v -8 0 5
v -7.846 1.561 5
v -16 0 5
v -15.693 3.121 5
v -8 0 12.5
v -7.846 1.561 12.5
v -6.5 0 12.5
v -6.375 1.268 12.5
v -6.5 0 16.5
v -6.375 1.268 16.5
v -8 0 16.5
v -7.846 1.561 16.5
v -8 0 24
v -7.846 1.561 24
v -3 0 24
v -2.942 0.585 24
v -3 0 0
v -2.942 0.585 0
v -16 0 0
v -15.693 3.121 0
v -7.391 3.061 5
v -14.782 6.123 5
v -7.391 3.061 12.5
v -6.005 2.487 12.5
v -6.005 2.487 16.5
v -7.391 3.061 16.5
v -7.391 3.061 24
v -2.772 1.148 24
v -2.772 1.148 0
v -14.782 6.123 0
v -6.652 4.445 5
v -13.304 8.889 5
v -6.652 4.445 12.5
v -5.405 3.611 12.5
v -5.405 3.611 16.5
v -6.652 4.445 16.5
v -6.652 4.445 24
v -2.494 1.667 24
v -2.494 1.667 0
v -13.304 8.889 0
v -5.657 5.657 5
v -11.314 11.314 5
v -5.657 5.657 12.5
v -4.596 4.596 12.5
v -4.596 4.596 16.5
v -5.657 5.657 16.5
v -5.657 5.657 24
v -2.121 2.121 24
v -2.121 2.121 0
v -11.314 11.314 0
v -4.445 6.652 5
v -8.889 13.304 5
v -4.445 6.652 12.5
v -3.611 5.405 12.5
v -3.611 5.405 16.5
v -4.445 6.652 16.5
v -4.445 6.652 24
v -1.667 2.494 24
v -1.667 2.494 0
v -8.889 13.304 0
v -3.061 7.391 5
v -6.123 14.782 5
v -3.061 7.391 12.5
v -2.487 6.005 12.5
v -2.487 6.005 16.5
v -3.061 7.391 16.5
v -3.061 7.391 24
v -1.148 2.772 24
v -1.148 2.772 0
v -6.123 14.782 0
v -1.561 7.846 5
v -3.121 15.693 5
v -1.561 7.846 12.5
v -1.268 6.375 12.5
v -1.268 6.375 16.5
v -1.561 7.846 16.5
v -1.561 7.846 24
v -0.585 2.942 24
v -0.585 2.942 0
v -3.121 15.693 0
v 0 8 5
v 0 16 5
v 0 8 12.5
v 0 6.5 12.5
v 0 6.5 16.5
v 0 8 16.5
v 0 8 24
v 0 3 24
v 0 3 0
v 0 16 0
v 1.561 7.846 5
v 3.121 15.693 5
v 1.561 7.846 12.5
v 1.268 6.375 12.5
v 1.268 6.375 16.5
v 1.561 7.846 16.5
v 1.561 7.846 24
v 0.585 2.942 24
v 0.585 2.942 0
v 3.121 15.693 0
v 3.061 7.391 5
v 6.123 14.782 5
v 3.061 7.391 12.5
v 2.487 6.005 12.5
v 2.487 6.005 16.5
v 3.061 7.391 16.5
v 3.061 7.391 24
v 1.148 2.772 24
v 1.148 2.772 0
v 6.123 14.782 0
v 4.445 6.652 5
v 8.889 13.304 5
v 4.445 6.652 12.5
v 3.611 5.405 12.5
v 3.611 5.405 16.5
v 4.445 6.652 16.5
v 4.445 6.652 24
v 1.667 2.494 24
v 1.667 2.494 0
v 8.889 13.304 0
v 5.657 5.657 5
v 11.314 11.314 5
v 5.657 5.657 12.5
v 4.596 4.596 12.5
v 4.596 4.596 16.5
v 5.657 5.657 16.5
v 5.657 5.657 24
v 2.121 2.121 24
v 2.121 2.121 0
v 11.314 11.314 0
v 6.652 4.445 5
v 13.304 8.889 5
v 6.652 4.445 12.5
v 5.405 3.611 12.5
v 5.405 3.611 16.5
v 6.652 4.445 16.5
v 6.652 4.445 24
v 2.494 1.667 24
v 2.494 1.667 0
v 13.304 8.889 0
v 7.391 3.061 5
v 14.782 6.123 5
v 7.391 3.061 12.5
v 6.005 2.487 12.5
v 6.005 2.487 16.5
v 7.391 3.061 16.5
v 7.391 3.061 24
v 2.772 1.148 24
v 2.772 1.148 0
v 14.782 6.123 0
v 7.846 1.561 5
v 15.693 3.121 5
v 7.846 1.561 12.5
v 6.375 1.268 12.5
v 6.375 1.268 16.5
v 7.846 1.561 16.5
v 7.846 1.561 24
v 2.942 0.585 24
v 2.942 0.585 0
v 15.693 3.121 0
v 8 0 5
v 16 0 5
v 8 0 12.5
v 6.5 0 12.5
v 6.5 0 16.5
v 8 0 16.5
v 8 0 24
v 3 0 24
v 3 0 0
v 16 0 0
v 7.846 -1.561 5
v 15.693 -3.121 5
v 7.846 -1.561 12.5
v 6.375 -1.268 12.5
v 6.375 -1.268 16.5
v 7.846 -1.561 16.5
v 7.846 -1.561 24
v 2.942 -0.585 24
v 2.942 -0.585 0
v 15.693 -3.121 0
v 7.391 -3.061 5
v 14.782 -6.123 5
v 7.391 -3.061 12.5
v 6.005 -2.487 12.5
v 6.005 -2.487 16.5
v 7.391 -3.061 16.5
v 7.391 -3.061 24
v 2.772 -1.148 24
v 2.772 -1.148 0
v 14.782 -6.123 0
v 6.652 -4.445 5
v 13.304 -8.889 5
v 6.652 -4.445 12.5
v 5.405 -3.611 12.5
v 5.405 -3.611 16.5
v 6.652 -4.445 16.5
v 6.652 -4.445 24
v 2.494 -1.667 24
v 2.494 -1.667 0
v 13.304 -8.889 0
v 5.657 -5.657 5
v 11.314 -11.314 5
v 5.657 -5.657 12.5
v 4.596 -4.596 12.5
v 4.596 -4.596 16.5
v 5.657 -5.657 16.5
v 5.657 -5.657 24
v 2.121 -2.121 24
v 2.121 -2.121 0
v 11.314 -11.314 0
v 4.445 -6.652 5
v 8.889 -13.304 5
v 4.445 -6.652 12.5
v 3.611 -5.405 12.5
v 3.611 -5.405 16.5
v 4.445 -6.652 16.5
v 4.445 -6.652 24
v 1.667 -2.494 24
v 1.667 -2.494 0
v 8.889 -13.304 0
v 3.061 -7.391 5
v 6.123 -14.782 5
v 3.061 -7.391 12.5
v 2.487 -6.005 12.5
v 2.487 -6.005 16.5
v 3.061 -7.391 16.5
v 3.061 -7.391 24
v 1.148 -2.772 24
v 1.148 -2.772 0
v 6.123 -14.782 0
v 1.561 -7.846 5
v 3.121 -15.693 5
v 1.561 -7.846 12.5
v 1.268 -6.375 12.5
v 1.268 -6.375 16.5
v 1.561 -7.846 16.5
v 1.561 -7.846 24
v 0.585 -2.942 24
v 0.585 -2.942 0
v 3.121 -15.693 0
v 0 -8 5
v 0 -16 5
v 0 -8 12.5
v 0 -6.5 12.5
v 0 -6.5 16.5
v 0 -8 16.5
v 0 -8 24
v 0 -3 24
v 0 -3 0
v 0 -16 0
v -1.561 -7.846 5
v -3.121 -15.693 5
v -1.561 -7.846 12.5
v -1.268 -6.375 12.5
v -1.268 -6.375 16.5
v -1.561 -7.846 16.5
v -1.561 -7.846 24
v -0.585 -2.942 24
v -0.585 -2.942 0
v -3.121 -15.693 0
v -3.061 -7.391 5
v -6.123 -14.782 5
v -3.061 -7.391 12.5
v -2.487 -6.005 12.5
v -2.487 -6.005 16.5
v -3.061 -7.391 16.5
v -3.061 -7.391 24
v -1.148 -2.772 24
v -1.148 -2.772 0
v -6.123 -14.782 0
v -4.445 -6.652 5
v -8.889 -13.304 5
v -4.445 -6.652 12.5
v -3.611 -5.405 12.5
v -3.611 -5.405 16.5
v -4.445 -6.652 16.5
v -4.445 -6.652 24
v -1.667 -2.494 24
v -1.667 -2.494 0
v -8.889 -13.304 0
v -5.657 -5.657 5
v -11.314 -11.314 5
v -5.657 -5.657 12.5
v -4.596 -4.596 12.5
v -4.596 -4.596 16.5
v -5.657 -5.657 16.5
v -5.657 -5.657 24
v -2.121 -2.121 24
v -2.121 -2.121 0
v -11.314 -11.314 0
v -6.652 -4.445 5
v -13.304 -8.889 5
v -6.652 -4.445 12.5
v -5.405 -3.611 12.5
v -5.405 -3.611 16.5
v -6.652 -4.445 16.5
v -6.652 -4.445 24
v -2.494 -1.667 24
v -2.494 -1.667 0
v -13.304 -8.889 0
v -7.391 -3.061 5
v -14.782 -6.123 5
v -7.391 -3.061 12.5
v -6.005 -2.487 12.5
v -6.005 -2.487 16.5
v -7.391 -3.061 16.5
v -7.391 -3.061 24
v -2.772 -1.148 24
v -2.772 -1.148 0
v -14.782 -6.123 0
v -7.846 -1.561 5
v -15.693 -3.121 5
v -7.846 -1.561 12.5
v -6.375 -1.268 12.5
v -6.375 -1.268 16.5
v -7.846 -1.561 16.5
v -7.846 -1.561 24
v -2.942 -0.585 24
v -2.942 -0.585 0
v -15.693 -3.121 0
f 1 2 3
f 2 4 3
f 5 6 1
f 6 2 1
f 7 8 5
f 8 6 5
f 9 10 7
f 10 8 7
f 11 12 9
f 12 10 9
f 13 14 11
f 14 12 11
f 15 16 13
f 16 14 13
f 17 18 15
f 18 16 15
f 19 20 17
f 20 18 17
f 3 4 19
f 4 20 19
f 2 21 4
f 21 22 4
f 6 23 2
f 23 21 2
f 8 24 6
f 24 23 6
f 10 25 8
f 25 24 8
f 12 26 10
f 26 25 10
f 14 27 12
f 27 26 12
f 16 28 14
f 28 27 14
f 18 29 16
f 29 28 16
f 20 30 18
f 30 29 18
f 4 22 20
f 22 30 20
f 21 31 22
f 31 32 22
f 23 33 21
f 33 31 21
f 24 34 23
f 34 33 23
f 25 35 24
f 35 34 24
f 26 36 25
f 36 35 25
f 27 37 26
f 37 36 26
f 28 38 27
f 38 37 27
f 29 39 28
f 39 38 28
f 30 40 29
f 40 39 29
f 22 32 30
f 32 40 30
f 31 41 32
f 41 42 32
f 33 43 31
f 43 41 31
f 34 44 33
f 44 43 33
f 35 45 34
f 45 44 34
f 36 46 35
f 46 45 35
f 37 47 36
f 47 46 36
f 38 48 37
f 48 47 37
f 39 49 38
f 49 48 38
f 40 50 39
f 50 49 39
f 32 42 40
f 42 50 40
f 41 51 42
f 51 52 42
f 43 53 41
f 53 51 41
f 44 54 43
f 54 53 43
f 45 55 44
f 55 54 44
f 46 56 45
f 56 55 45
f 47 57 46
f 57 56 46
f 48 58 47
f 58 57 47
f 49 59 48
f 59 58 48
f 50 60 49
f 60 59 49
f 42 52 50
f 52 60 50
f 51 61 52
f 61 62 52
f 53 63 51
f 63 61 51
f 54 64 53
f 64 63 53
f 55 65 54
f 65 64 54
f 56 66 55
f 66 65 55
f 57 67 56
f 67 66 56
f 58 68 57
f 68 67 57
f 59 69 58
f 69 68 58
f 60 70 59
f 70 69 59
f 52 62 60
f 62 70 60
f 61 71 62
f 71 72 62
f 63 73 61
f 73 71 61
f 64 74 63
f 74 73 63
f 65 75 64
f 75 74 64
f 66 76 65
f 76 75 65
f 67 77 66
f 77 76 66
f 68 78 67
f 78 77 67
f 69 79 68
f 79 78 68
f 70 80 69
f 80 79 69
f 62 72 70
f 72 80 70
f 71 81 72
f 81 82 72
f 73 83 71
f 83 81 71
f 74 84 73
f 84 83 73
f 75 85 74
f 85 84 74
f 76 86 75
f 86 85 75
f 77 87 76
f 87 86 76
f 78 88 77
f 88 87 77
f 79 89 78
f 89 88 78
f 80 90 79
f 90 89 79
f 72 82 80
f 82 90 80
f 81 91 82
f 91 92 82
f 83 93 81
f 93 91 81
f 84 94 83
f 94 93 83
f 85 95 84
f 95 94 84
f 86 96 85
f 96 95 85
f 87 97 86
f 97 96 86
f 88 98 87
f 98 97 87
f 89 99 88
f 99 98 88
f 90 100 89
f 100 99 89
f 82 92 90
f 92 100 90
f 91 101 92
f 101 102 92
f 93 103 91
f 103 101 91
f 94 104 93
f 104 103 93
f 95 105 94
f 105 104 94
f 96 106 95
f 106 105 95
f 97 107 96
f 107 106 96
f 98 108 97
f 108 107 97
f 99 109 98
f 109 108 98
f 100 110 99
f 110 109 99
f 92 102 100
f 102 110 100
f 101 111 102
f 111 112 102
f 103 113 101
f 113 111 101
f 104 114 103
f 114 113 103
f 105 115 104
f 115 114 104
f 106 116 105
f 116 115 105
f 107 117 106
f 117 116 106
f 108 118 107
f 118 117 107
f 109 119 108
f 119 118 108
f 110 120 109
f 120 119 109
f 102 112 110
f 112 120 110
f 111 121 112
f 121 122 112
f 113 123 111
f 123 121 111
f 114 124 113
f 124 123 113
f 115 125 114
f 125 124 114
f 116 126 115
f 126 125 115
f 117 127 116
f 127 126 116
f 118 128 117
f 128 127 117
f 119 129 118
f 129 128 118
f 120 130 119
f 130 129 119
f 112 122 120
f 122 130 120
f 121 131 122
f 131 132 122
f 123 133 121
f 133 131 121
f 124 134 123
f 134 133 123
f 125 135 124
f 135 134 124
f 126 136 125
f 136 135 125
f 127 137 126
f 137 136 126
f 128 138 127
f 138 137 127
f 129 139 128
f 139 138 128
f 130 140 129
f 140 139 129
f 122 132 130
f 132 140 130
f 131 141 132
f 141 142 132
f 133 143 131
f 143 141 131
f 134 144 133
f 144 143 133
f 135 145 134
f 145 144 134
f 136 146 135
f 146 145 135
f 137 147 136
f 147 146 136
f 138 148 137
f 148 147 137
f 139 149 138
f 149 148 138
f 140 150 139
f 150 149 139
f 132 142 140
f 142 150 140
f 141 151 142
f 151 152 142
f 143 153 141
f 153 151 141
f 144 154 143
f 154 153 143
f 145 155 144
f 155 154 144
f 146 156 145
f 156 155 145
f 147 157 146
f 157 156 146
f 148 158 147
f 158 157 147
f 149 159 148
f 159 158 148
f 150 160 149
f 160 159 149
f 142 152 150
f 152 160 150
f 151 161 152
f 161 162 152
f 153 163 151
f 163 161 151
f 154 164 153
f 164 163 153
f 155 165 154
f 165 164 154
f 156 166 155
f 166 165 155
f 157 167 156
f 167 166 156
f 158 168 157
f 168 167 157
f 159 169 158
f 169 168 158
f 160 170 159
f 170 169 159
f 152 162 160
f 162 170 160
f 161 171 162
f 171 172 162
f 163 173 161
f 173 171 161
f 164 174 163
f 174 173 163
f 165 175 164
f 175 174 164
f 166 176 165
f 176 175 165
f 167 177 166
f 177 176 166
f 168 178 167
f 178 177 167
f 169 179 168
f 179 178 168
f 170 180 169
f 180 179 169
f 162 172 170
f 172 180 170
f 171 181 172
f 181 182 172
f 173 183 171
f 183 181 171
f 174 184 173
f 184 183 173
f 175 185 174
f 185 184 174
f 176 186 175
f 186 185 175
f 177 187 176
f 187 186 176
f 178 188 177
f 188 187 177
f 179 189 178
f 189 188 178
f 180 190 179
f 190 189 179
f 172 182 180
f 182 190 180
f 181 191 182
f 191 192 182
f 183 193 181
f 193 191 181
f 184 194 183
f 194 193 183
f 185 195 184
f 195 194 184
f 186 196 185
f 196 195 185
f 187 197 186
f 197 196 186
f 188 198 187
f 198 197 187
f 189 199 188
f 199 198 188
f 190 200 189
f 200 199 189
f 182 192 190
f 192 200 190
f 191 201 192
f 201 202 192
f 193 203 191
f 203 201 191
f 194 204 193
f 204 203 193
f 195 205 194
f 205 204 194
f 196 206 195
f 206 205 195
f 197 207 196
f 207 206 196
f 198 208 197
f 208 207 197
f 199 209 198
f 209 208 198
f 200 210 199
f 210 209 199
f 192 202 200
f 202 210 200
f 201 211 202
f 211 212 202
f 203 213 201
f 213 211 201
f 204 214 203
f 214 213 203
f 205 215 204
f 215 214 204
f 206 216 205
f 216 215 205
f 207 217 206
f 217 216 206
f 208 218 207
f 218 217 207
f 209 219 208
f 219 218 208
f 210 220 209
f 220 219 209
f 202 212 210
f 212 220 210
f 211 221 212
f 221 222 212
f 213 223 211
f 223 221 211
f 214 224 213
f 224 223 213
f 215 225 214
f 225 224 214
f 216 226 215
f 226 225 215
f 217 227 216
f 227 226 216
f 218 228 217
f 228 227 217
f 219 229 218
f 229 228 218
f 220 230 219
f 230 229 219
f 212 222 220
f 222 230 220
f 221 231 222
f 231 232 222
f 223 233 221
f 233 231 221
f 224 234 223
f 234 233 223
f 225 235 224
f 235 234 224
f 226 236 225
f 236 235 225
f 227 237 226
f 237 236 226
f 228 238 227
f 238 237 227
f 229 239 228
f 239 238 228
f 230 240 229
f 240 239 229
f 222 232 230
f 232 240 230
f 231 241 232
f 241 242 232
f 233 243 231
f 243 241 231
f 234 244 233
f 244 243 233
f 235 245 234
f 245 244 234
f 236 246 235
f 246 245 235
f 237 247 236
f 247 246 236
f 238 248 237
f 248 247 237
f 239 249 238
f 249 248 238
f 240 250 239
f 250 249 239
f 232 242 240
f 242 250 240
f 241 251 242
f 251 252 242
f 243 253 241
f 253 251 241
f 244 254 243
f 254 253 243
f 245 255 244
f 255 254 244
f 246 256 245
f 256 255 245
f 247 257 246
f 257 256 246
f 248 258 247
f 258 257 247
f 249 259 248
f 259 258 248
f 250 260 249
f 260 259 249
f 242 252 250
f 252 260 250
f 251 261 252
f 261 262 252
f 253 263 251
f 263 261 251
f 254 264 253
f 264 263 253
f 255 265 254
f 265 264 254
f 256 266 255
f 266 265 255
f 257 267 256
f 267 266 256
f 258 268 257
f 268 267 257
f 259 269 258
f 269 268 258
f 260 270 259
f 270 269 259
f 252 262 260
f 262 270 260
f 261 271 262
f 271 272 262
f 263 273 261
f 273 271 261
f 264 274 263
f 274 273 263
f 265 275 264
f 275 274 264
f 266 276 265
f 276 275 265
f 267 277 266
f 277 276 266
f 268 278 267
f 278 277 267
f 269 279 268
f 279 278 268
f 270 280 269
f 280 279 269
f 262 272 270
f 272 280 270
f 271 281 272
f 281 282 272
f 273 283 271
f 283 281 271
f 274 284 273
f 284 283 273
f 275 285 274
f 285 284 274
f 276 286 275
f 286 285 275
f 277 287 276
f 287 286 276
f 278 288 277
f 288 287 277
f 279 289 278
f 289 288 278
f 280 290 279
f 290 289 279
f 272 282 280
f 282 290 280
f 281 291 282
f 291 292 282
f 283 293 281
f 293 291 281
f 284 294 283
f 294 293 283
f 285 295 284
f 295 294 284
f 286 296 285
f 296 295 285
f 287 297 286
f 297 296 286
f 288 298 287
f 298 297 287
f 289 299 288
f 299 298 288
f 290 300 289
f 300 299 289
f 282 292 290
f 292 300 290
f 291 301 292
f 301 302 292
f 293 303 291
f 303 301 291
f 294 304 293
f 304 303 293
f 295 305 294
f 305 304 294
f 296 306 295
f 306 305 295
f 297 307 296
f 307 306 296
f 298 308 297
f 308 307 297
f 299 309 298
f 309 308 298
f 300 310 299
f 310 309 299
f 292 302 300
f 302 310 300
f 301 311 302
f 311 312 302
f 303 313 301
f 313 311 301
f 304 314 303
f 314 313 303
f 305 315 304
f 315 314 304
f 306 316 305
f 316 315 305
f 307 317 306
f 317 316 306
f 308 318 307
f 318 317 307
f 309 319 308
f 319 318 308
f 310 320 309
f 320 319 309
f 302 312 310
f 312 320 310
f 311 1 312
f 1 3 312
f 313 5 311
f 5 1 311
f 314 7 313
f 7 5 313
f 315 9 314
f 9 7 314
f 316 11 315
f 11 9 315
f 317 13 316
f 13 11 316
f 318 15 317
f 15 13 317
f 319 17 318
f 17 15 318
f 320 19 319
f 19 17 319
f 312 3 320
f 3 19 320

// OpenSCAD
$fn = 32;

// ----------------------------------------------------------------------
// Grooved revolve: flanged, bore R3
// ----------------------------------------------------------------------

// --- parameters (mm) ---
bore_r = 3;               // bore radius
outer_r = 8;              // outer radius of the body
total_h = 24;             // overall height, Z
wall = 5;                 // radial wall thickness
groove_w = 4;             // groove width
groove_d = 1.5;           // groove depth
grooves = 1;              // number of outer grooves
flange_r = 16;            // flange radius
flange_h = 5;             // flange height
fit_tol = 0.1;            // declared fit tolerance (prompt contract)
free_tol = 0.5;           // declared free tolerance (prompt contract)

bbox_x = 2 * flange_r;  // full diameter
bore_d = 2 * bore_r;  // bore diameter
body_d = 2 * outer_r;  // body diameter
flange_d = 2 * flange_r;  // flange diameter
revolve_angle = 360;  // full turn around the Z axis

profile = [[3, 0], [8, 0], [16, 0], [16, 5], [8, 5], [8, 12.5], [6.5, 12.5], [6.5, 16.5], [8, 16.5], [8, 24], [3, 24]];  // primary outline, 11 points, counter clockwise

// --- the one profile operation ---
rotate_extrude(angle = revolve_angle) polygon(points = profile);
